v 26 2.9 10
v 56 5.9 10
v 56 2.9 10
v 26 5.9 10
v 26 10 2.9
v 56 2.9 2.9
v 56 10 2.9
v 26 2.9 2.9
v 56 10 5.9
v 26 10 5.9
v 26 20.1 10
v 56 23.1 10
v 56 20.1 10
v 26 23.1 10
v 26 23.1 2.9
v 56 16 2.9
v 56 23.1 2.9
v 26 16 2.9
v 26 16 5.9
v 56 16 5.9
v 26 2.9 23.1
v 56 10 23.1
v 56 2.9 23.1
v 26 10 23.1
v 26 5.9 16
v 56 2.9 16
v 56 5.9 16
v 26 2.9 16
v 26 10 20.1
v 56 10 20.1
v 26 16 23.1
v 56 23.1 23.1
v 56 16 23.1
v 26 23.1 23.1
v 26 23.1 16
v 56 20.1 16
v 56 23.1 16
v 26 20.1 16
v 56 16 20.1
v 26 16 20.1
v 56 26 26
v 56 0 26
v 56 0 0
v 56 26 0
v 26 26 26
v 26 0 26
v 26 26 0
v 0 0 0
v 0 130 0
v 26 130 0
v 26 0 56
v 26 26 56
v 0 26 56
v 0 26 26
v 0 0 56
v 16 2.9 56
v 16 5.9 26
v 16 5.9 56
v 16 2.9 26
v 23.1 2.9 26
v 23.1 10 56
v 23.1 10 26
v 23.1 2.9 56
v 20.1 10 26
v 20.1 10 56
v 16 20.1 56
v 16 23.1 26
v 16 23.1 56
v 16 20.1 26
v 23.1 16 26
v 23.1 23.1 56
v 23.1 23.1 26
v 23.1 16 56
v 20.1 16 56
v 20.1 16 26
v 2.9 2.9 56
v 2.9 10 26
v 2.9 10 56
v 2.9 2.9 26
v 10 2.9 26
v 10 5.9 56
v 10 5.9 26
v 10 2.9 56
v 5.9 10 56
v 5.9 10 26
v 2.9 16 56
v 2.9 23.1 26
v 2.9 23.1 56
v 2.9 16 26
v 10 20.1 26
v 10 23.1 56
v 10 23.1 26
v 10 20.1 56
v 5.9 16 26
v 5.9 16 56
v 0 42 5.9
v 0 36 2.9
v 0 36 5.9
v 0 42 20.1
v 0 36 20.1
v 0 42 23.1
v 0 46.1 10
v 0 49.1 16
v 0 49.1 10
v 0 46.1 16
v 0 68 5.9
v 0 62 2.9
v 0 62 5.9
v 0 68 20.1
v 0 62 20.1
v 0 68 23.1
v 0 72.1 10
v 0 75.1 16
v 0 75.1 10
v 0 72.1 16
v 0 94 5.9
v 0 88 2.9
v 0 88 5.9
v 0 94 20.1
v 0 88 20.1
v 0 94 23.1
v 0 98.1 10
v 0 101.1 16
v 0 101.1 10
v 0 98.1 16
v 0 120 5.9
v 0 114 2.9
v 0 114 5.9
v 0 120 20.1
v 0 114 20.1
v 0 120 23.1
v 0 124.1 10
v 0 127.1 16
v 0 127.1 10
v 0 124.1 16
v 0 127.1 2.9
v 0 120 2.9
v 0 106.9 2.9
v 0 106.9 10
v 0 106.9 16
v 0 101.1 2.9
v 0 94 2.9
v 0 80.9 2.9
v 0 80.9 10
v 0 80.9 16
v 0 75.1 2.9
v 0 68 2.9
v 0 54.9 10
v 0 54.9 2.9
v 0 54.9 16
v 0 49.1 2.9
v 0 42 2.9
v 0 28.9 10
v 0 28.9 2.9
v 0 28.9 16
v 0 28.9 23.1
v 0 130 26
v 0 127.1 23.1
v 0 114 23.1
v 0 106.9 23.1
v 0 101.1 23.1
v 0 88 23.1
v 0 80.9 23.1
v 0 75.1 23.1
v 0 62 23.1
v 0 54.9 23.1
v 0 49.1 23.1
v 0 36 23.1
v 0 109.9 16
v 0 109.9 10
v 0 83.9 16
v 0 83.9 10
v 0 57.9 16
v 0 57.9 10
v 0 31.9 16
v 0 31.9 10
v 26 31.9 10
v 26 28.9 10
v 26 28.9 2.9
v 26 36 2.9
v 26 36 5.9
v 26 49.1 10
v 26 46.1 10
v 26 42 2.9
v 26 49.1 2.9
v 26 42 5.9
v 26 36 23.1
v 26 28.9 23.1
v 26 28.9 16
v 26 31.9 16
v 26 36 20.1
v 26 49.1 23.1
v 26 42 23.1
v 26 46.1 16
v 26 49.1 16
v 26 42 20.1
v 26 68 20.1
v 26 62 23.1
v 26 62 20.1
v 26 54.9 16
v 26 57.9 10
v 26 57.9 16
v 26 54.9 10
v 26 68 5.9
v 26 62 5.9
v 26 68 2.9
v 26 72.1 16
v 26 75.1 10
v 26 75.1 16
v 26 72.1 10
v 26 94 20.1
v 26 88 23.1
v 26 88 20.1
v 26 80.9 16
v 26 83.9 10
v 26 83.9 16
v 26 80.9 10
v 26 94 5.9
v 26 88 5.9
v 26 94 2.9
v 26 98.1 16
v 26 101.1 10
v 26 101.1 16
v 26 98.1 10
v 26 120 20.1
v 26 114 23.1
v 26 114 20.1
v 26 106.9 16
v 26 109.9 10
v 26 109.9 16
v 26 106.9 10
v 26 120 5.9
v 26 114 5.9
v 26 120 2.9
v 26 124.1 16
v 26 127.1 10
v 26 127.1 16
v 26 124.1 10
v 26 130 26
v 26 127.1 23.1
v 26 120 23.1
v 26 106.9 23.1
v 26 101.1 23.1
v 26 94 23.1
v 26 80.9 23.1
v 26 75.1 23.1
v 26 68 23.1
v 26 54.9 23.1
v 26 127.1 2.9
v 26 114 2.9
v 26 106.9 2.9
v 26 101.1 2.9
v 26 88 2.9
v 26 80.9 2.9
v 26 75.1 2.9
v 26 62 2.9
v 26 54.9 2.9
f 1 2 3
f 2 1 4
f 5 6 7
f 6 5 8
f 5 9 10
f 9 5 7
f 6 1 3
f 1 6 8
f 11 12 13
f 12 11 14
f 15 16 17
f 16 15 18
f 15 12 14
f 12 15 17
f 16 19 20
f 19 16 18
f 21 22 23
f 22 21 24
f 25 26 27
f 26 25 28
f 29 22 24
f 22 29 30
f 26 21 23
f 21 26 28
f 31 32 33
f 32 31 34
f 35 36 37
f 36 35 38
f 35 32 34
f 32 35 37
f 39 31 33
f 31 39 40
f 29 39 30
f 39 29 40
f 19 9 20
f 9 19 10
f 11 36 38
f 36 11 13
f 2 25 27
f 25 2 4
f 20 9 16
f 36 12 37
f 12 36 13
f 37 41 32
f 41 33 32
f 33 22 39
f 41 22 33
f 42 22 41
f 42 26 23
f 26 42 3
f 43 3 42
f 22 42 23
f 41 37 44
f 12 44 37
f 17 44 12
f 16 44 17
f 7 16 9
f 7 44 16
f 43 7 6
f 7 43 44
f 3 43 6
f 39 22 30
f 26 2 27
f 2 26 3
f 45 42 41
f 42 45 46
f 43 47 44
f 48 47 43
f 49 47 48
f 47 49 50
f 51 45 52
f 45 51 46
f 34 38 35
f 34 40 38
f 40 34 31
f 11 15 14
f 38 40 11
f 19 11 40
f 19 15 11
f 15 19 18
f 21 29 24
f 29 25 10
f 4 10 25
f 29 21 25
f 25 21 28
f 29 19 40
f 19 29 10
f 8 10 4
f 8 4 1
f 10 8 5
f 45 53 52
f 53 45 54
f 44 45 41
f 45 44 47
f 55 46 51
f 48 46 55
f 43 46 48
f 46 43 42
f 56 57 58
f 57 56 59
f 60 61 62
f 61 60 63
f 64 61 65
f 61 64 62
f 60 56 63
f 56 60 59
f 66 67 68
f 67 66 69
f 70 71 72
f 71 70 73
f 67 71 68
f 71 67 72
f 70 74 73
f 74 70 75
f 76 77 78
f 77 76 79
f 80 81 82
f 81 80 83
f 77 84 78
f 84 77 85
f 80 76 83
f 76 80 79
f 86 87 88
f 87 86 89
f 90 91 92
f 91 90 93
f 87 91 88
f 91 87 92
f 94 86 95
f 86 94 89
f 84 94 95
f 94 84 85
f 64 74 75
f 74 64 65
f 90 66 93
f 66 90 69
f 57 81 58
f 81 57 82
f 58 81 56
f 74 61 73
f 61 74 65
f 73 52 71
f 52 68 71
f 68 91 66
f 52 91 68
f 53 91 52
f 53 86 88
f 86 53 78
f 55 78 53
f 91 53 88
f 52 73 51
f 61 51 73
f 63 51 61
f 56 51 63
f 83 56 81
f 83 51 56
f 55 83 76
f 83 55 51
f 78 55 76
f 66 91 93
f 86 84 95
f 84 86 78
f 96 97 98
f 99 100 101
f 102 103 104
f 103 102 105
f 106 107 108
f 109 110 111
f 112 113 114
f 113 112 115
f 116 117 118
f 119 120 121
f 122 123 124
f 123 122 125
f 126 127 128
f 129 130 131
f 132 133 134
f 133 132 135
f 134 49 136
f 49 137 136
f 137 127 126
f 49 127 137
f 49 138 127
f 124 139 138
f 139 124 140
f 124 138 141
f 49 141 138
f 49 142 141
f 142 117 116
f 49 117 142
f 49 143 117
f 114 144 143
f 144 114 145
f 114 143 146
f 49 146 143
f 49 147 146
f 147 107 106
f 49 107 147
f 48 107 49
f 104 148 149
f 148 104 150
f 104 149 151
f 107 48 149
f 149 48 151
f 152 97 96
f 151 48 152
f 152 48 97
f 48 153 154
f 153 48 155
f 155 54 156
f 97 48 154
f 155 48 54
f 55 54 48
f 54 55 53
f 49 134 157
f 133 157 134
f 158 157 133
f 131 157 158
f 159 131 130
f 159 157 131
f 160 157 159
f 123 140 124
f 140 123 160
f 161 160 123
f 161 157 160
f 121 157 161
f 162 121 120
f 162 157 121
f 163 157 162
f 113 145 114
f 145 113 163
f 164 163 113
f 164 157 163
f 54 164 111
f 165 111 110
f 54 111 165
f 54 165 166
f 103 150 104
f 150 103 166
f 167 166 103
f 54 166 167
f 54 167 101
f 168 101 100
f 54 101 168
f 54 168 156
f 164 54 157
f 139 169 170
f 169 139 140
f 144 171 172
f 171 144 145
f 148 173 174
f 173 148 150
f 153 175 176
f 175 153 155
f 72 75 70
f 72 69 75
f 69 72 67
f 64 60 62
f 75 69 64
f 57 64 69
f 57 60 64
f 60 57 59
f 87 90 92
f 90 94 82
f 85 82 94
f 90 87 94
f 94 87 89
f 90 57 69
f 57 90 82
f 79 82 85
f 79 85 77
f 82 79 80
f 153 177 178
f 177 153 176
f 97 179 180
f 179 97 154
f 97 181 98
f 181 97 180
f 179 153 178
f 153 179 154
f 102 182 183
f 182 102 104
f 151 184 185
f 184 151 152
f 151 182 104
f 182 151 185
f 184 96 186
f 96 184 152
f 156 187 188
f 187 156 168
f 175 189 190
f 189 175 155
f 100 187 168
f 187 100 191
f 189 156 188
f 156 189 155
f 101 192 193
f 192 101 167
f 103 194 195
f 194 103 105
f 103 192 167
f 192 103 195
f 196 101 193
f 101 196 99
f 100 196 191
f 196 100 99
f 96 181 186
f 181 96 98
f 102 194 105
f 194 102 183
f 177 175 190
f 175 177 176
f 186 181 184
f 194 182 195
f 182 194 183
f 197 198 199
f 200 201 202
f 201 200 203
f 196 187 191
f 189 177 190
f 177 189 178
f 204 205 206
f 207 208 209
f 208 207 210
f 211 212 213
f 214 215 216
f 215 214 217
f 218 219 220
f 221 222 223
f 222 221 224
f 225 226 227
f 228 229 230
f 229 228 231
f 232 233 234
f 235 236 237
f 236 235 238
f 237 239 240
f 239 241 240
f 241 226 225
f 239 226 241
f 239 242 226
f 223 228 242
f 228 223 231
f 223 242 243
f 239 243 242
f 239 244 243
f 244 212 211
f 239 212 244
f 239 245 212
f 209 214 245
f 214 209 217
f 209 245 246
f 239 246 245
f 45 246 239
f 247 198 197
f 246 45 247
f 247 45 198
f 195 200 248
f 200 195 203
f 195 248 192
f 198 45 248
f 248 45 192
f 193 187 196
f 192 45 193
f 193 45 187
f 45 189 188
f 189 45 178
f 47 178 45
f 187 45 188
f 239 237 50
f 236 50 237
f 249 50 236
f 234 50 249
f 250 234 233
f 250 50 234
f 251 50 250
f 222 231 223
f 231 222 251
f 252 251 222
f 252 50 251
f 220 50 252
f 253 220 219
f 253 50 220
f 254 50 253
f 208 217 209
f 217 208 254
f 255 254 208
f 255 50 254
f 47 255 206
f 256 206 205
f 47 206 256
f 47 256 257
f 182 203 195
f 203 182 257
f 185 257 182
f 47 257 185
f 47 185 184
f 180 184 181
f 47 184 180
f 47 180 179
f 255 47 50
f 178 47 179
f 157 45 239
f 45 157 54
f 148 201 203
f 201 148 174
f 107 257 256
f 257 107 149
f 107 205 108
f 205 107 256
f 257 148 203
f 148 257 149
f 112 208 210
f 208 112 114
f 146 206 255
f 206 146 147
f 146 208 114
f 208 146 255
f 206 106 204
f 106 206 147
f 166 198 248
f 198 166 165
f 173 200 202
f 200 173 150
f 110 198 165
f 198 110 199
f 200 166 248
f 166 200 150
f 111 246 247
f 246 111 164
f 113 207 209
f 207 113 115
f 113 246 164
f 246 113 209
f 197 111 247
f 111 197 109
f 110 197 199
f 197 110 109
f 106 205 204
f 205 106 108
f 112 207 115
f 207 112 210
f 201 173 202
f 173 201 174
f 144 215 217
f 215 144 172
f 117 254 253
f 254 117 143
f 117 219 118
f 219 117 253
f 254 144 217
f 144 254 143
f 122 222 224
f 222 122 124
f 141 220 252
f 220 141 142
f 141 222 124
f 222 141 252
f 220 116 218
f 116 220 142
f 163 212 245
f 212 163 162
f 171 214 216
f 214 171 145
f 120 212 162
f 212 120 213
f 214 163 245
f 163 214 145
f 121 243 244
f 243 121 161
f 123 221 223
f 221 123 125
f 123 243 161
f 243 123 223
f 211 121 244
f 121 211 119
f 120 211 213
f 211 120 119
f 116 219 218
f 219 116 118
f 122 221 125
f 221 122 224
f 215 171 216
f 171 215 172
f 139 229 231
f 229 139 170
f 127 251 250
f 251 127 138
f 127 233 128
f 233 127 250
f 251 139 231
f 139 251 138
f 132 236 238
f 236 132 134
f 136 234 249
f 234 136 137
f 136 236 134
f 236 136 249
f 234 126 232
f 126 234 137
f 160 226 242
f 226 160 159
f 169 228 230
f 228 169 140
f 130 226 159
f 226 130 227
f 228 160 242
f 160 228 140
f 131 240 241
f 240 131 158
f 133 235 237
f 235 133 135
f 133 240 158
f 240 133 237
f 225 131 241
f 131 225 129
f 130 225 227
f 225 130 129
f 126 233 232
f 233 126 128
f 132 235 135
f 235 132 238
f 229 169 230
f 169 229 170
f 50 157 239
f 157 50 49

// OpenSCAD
// file: modules_coin_0_4.scad
/* [Tips] */
// Length of the tips
tipsL = 30.0;  // [1,2,3,4,5,6,7,8,9,30]
// Width of the tips
tipsW = 26.0;

/* [Profiles] */
// Width of the profiles
profilesW = 20.2;

/* [Blocs] */
// Length of the blocs
blocsL = 6;
// Width of the blocs
blocsW = 3;

/* [Hidden] */

// to avoid "z fighting" where surfaces line up exactly, add a bit of fudge
fudge = 0.1;

module void_profile(
    length,         // Length of the profile
    width = 20,     // Width of the profile
    blocL = 6,      // Lenght of the bloc
    blocW = 3,      // Width of the bloc
    fudge = 0.1)    // 
{
    step = (width - blocL)/2;
    
    // Bottom-left hole
    translate([-fudge,0,0])             
    cube([length+2*fudge,step,step]);

    // Bottom-rigth hole
    translate([-fudge,step+blocL,0])    
    cube([length+2*fudge,step,step]);

    // Top-left hole
    translate([-fudge,0,step+blocL])
    cube([length+2*fudge,step,step]);

    // Top-rigth hole
    translate([-fudge,step+blocL,step+blocL])
    cube([length+2*fudge,step,step]);

    // Middle hole
    translate([-fudge,blocW,blocW])
    cube([length+2*fudge,width-2*blocW,width-2*blocW]);
}

module tip_profile(
    tipL,           // Length of the tip
    tipW,           // Width of the tip
    profileW,       // Width of the profile
    blocL,          // Length of the bloc
    blocW,          // Width of the bloc
    fudge=0.1)        // 
{
    difference()
    {
        // The tip
        color("blue")
        cube([tipL, tipW, tipW]);
        
        color("red")
        translate([0, (tipW-profileW)/2, (tipW-profileW)/2])
        void_profile(tipL+fudge, profileW, blocL, blocW, fudge);
    }
}

union()
{
    //color("green")
    //cube(tipsW);

    //translate([tipsW, 0, 0])
    tip_profile(tipsL, tipsW, profilesW, blocsL, blocsW, fudge);
}
// main file
use <modules_coin_0_4.scad>

/* [Corner] */
// Number of arcs passing throught
nbArc = 4;

/* [Tips] */
// Length of the tips
tipsL = 30.0;  // [1,2,3,4,5,6,7,8,9,30]
// Width of the tips
tipsW = 26.0;

/* [Profiles] */
// Width of the profiles
profilesW = 20.2;

/* [Blocs] */
// Length of the blocs
blocsL = 6;
// Width of the blocs
blocsW = 3;

/* [Hidden] */

// to avoid "z fighting" where surfaces line up exactly, add a bit of fudge
fudge = 0.1;


union()
{
    color("yellow")
    cube([tipsW, tipsW, tipsW]);

    translate([tipsW, 0, 0])
    tip_profile(tipsL, tipsW, profilesW, blocsL, blocsW, fudge);

    translate([tipsW, 0, tipsW])
    rotate([0,-90,0])
    tip_profile(tipsL, tipsW, profilesW, blocsL, blocsW, fudge);

    for (i = [1:1:nbArc])
    {
        translate([0, i*tipsW, 0])
        tip_profile(tipsW, tipsW, profilesW, blocsL, blocsW, fudge);
    }
}
